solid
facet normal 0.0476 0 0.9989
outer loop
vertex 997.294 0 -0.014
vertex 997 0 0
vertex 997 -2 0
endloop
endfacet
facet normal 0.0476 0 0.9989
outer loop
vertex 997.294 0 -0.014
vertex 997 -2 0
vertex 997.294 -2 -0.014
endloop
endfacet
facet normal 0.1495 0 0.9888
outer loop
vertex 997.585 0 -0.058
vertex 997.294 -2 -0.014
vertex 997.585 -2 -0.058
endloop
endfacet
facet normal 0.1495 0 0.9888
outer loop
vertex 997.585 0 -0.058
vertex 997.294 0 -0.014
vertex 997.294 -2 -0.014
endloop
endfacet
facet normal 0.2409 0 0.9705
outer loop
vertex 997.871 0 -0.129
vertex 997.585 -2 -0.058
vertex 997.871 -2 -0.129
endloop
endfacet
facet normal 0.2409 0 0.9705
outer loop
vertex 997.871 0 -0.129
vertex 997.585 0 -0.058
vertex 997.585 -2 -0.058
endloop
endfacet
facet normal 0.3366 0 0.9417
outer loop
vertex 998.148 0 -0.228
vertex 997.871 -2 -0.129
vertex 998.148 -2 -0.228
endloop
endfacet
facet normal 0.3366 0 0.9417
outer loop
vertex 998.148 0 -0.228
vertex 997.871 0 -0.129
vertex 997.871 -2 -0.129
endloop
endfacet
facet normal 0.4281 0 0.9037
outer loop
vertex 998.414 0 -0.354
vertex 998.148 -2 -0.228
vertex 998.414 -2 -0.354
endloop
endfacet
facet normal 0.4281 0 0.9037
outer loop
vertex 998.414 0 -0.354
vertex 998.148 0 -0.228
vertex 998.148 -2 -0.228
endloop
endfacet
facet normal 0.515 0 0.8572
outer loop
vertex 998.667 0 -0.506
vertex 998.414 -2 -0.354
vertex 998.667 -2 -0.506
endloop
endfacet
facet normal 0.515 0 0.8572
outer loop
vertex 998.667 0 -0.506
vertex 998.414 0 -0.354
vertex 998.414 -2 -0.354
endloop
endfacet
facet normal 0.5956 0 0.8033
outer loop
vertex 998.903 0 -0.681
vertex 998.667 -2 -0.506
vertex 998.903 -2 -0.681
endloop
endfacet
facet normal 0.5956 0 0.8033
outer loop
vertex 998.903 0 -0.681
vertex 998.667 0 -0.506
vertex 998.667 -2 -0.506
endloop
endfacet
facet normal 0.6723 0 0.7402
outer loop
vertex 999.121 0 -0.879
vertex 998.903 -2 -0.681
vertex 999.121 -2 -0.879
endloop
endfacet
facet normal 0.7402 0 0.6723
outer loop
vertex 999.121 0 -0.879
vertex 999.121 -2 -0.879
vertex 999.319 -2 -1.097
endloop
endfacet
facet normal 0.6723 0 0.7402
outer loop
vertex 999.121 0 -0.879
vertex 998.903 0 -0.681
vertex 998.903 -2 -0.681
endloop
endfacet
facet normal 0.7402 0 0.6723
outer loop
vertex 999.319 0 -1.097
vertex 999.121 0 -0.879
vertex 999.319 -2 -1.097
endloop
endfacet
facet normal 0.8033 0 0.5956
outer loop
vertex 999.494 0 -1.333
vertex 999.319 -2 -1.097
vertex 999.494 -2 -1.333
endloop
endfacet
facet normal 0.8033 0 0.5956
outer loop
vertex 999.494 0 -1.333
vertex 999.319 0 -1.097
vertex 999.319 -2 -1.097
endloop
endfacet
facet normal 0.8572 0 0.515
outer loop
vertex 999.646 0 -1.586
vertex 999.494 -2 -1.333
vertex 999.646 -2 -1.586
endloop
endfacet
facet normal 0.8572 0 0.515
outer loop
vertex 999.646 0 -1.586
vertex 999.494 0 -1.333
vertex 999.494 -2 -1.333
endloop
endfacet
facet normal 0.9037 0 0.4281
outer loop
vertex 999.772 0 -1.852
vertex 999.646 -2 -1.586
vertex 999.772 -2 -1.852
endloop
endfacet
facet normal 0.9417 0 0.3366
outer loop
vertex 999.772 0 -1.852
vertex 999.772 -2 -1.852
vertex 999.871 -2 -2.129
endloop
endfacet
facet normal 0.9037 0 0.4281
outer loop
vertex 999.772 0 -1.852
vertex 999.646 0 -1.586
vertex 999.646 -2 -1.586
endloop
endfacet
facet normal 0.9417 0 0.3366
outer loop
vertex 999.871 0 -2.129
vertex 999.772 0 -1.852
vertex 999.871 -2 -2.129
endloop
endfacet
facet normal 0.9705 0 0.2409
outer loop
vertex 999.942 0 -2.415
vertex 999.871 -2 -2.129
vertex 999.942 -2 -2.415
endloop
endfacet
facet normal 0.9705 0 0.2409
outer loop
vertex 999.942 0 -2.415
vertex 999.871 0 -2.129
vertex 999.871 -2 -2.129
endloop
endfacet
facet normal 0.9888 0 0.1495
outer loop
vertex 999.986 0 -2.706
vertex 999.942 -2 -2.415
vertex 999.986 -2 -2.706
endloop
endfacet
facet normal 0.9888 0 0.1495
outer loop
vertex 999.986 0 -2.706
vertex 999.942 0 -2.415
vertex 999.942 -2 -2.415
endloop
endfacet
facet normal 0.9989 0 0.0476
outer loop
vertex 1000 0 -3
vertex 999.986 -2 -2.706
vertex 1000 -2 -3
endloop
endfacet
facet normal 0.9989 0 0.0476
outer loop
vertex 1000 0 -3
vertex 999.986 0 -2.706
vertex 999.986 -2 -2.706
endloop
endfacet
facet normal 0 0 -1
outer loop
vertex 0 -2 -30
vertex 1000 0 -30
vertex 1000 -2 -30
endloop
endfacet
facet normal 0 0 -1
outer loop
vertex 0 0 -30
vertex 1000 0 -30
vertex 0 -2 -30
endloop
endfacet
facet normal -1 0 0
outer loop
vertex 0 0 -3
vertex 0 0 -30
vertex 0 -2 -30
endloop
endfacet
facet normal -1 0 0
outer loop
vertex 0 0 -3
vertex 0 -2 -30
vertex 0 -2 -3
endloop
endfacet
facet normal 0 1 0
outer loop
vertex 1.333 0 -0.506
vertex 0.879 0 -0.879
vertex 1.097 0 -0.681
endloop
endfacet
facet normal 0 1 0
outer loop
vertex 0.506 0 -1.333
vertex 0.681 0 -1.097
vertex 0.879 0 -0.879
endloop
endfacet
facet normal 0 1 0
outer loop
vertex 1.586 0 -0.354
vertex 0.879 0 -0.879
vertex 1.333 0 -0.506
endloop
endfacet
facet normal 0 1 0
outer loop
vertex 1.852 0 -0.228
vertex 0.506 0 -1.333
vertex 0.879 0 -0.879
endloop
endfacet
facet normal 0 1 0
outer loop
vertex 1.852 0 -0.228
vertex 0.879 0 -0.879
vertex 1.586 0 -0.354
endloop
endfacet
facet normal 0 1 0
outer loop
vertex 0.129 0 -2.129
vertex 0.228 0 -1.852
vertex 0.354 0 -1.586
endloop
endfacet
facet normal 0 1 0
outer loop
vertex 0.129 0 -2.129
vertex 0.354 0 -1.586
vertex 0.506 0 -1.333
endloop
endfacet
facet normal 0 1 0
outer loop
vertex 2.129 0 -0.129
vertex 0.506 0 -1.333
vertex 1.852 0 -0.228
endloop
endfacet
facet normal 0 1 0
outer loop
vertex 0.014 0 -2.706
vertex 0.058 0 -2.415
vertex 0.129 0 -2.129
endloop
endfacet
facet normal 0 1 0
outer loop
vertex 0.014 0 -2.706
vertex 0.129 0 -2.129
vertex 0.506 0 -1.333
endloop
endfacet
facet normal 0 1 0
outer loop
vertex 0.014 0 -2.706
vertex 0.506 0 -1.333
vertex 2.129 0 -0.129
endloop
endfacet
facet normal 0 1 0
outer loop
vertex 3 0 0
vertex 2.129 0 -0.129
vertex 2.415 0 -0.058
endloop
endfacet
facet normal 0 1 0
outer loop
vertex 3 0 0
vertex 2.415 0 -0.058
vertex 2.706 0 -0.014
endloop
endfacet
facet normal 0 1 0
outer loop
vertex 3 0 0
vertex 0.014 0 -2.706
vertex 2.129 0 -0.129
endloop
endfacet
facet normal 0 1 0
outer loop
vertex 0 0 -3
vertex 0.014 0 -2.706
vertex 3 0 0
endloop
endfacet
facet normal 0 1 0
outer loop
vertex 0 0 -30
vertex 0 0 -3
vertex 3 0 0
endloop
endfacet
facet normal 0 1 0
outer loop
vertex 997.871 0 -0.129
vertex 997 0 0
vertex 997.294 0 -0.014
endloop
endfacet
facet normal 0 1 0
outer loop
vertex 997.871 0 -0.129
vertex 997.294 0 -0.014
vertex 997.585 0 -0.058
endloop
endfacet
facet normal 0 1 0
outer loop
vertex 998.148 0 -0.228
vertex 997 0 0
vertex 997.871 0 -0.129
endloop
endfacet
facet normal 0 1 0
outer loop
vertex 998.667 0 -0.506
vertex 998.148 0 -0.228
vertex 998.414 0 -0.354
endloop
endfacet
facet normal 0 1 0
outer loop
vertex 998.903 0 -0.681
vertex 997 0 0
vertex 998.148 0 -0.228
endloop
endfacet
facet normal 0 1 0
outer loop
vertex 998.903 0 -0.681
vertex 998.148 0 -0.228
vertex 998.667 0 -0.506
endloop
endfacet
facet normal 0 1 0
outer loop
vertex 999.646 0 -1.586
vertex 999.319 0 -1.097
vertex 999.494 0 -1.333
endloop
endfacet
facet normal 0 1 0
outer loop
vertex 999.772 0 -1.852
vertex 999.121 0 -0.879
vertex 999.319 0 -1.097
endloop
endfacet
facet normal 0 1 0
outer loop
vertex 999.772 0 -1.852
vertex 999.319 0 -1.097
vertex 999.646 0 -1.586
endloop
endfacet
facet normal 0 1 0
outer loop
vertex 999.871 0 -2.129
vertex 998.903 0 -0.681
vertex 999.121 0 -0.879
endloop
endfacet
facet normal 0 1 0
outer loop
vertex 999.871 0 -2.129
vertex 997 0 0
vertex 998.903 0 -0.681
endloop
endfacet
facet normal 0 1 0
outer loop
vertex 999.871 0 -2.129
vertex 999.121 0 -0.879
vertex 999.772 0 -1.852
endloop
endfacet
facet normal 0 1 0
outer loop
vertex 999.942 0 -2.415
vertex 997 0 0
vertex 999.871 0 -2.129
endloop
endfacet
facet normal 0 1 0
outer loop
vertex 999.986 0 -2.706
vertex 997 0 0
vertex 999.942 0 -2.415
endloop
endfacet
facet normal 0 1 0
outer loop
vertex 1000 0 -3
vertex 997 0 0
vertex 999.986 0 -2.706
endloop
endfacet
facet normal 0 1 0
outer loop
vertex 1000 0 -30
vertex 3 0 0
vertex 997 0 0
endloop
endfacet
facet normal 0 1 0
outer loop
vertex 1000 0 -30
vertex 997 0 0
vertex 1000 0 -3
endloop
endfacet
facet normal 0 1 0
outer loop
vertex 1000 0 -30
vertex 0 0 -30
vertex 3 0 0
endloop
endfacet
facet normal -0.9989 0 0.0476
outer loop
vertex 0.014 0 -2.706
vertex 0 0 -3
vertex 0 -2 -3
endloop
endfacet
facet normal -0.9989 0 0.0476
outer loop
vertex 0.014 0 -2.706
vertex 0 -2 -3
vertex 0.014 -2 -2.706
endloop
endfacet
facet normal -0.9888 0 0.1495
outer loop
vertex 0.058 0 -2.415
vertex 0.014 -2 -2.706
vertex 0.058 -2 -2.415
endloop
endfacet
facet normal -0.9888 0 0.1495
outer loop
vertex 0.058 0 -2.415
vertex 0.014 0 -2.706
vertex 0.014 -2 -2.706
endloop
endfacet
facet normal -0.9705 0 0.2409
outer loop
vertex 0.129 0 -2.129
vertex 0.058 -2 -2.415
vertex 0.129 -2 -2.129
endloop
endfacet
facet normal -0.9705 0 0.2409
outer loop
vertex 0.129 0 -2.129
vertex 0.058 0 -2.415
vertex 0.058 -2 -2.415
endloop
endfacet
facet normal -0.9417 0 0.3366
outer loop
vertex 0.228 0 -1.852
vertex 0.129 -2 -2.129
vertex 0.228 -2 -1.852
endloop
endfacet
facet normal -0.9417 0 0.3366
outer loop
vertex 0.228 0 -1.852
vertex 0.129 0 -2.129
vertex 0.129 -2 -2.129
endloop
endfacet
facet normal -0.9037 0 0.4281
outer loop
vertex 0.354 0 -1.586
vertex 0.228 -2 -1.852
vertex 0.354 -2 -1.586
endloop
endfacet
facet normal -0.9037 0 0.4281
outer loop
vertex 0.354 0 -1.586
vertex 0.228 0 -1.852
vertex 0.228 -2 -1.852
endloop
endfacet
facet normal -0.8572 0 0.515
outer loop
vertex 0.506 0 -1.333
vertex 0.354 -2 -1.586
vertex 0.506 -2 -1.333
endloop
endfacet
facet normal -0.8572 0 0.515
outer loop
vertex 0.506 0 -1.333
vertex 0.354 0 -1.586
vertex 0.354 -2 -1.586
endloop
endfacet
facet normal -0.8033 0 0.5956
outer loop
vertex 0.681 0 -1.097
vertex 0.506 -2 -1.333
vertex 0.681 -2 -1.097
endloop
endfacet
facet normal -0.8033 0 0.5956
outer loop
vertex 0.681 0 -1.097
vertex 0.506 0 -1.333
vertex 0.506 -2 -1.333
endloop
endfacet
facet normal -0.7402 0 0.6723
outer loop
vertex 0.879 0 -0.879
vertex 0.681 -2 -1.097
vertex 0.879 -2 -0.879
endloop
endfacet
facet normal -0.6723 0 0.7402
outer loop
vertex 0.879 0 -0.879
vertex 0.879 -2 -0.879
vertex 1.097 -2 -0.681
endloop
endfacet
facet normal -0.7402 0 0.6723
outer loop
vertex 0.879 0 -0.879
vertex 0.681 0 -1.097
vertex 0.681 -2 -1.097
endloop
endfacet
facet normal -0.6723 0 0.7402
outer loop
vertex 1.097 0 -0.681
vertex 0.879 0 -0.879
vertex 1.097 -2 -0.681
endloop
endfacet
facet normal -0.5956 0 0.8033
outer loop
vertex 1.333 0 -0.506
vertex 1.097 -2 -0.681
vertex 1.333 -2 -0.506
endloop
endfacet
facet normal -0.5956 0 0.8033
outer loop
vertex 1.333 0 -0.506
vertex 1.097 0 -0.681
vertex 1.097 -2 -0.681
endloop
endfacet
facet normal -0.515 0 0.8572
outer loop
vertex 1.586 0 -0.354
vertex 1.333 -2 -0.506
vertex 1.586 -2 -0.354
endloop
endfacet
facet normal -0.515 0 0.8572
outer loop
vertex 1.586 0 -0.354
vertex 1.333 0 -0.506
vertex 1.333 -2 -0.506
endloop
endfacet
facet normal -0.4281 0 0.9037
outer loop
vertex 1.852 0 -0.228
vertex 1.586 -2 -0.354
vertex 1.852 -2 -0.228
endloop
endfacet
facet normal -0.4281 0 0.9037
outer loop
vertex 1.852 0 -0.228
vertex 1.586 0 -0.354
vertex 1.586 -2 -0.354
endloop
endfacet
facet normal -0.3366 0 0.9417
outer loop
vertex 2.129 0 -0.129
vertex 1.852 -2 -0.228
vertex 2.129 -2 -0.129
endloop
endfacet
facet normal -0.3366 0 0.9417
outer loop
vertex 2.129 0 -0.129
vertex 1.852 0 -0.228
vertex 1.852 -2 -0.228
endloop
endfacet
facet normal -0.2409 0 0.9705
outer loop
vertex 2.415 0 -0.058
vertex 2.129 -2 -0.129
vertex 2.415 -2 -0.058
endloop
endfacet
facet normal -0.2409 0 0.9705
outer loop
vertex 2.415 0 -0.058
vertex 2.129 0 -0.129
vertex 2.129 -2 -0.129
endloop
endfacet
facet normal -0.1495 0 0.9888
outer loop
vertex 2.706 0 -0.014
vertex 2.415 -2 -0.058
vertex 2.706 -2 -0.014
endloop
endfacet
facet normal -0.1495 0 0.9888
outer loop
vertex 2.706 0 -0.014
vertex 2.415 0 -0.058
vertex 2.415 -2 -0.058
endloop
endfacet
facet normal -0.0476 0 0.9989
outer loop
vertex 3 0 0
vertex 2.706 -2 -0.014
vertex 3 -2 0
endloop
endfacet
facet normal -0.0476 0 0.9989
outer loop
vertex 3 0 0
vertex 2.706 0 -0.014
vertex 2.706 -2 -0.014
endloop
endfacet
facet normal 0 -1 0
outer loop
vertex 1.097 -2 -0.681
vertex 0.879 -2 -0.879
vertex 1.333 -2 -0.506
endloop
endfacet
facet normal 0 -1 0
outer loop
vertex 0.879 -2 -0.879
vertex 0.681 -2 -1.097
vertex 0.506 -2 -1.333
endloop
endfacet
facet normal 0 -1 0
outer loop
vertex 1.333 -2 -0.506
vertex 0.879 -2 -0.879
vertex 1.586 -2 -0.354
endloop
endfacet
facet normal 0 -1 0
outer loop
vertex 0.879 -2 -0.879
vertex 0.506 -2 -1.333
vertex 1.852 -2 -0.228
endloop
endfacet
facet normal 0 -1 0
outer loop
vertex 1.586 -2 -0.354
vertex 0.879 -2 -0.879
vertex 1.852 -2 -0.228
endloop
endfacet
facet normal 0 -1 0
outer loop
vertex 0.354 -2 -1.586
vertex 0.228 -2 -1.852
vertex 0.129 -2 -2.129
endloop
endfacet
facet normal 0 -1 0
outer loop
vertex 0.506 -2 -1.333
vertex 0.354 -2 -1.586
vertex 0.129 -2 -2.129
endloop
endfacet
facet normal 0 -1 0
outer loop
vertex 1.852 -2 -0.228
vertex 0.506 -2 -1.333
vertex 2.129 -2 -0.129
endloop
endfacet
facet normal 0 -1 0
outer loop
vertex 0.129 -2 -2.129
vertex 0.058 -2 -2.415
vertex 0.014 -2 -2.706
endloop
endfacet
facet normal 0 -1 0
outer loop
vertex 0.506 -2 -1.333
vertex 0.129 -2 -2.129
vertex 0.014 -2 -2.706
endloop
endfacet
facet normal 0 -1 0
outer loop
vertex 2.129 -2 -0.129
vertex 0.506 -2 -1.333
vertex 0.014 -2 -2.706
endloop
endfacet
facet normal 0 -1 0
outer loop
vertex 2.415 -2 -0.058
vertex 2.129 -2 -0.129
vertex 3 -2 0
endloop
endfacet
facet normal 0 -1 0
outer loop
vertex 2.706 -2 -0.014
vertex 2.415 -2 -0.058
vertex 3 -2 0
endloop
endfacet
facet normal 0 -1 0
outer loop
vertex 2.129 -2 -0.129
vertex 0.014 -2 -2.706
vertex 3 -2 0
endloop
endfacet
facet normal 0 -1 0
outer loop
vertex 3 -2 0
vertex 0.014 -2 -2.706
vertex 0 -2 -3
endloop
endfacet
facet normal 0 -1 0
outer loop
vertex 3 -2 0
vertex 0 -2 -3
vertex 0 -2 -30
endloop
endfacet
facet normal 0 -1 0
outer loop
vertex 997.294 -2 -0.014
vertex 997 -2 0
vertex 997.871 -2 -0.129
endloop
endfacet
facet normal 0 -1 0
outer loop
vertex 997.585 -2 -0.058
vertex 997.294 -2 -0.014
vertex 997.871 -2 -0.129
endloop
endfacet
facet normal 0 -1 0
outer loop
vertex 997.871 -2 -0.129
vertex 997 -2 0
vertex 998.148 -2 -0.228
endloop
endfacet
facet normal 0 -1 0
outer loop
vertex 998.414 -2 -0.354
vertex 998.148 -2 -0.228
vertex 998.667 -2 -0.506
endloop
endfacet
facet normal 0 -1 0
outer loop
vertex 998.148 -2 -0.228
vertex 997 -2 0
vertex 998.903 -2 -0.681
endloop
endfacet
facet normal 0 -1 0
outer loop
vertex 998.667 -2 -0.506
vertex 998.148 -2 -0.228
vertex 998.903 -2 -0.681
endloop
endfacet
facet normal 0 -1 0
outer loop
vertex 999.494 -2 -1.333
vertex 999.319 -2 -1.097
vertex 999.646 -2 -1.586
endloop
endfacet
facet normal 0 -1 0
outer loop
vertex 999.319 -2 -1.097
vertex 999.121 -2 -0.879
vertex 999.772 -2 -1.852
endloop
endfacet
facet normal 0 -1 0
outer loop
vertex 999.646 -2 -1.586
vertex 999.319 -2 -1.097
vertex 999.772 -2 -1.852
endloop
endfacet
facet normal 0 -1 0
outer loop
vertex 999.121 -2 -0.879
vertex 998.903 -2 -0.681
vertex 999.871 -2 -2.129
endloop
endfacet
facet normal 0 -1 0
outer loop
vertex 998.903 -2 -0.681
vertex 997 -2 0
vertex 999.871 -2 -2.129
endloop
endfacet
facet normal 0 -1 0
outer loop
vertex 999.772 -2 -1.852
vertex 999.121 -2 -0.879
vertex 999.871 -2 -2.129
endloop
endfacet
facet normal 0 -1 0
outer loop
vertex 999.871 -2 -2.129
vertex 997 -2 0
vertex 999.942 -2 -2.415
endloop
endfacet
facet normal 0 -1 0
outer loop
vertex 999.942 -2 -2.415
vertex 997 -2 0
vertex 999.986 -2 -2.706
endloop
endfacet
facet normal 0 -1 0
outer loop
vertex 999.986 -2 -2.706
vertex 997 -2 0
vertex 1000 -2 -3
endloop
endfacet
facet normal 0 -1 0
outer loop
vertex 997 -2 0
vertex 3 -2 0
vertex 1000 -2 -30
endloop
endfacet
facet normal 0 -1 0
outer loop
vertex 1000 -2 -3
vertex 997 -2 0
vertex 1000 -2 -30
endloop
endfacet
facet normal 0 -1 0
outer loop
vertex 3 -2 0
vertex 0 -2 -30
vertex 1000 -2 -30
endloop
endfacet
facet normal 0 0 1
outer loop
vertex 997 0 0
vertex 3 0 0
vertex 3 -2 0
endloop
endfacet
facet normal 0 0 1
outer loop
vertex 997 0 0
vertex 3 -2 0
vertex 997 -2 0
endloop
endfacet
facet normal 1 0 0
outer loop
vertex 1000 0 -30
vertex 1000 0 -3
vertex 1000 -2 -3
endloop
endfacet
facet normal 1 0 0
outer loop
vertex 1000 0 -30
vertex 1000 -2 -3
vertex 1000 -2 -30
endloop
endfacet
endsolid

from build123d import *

# Parameters (mm, degrees)
SM_BASE_FLANGE_1_DEPTH = 2


# Sheet-metal steps are written as plain solids
with BuildPart() as part:
    # Sketch 1 → Базовая кромка1 (new body)
    with BuildSketch(Plane(origin=(0, 0, 0), x_dir=(1, 0, 0), z_dir=(0, 1, 0))):
        with BuildLine():
            Line((3, 0), (997, 0))
            ThreePointArc((997, 0), (999.121320344, 0.878679656), (1000, 3))
            Line((1000, 3), (1000, 30))
            Line((1000, 30), (0, 30))
            Line((0, 30), (0, 3))
            ThreePointArc((0, 3), (0.878679656, 0.878679656), (3, 0))
        make_face()
    extrude(amount=-SM_BASE_FLANGE_1_DEPTH)


solid = part.part
